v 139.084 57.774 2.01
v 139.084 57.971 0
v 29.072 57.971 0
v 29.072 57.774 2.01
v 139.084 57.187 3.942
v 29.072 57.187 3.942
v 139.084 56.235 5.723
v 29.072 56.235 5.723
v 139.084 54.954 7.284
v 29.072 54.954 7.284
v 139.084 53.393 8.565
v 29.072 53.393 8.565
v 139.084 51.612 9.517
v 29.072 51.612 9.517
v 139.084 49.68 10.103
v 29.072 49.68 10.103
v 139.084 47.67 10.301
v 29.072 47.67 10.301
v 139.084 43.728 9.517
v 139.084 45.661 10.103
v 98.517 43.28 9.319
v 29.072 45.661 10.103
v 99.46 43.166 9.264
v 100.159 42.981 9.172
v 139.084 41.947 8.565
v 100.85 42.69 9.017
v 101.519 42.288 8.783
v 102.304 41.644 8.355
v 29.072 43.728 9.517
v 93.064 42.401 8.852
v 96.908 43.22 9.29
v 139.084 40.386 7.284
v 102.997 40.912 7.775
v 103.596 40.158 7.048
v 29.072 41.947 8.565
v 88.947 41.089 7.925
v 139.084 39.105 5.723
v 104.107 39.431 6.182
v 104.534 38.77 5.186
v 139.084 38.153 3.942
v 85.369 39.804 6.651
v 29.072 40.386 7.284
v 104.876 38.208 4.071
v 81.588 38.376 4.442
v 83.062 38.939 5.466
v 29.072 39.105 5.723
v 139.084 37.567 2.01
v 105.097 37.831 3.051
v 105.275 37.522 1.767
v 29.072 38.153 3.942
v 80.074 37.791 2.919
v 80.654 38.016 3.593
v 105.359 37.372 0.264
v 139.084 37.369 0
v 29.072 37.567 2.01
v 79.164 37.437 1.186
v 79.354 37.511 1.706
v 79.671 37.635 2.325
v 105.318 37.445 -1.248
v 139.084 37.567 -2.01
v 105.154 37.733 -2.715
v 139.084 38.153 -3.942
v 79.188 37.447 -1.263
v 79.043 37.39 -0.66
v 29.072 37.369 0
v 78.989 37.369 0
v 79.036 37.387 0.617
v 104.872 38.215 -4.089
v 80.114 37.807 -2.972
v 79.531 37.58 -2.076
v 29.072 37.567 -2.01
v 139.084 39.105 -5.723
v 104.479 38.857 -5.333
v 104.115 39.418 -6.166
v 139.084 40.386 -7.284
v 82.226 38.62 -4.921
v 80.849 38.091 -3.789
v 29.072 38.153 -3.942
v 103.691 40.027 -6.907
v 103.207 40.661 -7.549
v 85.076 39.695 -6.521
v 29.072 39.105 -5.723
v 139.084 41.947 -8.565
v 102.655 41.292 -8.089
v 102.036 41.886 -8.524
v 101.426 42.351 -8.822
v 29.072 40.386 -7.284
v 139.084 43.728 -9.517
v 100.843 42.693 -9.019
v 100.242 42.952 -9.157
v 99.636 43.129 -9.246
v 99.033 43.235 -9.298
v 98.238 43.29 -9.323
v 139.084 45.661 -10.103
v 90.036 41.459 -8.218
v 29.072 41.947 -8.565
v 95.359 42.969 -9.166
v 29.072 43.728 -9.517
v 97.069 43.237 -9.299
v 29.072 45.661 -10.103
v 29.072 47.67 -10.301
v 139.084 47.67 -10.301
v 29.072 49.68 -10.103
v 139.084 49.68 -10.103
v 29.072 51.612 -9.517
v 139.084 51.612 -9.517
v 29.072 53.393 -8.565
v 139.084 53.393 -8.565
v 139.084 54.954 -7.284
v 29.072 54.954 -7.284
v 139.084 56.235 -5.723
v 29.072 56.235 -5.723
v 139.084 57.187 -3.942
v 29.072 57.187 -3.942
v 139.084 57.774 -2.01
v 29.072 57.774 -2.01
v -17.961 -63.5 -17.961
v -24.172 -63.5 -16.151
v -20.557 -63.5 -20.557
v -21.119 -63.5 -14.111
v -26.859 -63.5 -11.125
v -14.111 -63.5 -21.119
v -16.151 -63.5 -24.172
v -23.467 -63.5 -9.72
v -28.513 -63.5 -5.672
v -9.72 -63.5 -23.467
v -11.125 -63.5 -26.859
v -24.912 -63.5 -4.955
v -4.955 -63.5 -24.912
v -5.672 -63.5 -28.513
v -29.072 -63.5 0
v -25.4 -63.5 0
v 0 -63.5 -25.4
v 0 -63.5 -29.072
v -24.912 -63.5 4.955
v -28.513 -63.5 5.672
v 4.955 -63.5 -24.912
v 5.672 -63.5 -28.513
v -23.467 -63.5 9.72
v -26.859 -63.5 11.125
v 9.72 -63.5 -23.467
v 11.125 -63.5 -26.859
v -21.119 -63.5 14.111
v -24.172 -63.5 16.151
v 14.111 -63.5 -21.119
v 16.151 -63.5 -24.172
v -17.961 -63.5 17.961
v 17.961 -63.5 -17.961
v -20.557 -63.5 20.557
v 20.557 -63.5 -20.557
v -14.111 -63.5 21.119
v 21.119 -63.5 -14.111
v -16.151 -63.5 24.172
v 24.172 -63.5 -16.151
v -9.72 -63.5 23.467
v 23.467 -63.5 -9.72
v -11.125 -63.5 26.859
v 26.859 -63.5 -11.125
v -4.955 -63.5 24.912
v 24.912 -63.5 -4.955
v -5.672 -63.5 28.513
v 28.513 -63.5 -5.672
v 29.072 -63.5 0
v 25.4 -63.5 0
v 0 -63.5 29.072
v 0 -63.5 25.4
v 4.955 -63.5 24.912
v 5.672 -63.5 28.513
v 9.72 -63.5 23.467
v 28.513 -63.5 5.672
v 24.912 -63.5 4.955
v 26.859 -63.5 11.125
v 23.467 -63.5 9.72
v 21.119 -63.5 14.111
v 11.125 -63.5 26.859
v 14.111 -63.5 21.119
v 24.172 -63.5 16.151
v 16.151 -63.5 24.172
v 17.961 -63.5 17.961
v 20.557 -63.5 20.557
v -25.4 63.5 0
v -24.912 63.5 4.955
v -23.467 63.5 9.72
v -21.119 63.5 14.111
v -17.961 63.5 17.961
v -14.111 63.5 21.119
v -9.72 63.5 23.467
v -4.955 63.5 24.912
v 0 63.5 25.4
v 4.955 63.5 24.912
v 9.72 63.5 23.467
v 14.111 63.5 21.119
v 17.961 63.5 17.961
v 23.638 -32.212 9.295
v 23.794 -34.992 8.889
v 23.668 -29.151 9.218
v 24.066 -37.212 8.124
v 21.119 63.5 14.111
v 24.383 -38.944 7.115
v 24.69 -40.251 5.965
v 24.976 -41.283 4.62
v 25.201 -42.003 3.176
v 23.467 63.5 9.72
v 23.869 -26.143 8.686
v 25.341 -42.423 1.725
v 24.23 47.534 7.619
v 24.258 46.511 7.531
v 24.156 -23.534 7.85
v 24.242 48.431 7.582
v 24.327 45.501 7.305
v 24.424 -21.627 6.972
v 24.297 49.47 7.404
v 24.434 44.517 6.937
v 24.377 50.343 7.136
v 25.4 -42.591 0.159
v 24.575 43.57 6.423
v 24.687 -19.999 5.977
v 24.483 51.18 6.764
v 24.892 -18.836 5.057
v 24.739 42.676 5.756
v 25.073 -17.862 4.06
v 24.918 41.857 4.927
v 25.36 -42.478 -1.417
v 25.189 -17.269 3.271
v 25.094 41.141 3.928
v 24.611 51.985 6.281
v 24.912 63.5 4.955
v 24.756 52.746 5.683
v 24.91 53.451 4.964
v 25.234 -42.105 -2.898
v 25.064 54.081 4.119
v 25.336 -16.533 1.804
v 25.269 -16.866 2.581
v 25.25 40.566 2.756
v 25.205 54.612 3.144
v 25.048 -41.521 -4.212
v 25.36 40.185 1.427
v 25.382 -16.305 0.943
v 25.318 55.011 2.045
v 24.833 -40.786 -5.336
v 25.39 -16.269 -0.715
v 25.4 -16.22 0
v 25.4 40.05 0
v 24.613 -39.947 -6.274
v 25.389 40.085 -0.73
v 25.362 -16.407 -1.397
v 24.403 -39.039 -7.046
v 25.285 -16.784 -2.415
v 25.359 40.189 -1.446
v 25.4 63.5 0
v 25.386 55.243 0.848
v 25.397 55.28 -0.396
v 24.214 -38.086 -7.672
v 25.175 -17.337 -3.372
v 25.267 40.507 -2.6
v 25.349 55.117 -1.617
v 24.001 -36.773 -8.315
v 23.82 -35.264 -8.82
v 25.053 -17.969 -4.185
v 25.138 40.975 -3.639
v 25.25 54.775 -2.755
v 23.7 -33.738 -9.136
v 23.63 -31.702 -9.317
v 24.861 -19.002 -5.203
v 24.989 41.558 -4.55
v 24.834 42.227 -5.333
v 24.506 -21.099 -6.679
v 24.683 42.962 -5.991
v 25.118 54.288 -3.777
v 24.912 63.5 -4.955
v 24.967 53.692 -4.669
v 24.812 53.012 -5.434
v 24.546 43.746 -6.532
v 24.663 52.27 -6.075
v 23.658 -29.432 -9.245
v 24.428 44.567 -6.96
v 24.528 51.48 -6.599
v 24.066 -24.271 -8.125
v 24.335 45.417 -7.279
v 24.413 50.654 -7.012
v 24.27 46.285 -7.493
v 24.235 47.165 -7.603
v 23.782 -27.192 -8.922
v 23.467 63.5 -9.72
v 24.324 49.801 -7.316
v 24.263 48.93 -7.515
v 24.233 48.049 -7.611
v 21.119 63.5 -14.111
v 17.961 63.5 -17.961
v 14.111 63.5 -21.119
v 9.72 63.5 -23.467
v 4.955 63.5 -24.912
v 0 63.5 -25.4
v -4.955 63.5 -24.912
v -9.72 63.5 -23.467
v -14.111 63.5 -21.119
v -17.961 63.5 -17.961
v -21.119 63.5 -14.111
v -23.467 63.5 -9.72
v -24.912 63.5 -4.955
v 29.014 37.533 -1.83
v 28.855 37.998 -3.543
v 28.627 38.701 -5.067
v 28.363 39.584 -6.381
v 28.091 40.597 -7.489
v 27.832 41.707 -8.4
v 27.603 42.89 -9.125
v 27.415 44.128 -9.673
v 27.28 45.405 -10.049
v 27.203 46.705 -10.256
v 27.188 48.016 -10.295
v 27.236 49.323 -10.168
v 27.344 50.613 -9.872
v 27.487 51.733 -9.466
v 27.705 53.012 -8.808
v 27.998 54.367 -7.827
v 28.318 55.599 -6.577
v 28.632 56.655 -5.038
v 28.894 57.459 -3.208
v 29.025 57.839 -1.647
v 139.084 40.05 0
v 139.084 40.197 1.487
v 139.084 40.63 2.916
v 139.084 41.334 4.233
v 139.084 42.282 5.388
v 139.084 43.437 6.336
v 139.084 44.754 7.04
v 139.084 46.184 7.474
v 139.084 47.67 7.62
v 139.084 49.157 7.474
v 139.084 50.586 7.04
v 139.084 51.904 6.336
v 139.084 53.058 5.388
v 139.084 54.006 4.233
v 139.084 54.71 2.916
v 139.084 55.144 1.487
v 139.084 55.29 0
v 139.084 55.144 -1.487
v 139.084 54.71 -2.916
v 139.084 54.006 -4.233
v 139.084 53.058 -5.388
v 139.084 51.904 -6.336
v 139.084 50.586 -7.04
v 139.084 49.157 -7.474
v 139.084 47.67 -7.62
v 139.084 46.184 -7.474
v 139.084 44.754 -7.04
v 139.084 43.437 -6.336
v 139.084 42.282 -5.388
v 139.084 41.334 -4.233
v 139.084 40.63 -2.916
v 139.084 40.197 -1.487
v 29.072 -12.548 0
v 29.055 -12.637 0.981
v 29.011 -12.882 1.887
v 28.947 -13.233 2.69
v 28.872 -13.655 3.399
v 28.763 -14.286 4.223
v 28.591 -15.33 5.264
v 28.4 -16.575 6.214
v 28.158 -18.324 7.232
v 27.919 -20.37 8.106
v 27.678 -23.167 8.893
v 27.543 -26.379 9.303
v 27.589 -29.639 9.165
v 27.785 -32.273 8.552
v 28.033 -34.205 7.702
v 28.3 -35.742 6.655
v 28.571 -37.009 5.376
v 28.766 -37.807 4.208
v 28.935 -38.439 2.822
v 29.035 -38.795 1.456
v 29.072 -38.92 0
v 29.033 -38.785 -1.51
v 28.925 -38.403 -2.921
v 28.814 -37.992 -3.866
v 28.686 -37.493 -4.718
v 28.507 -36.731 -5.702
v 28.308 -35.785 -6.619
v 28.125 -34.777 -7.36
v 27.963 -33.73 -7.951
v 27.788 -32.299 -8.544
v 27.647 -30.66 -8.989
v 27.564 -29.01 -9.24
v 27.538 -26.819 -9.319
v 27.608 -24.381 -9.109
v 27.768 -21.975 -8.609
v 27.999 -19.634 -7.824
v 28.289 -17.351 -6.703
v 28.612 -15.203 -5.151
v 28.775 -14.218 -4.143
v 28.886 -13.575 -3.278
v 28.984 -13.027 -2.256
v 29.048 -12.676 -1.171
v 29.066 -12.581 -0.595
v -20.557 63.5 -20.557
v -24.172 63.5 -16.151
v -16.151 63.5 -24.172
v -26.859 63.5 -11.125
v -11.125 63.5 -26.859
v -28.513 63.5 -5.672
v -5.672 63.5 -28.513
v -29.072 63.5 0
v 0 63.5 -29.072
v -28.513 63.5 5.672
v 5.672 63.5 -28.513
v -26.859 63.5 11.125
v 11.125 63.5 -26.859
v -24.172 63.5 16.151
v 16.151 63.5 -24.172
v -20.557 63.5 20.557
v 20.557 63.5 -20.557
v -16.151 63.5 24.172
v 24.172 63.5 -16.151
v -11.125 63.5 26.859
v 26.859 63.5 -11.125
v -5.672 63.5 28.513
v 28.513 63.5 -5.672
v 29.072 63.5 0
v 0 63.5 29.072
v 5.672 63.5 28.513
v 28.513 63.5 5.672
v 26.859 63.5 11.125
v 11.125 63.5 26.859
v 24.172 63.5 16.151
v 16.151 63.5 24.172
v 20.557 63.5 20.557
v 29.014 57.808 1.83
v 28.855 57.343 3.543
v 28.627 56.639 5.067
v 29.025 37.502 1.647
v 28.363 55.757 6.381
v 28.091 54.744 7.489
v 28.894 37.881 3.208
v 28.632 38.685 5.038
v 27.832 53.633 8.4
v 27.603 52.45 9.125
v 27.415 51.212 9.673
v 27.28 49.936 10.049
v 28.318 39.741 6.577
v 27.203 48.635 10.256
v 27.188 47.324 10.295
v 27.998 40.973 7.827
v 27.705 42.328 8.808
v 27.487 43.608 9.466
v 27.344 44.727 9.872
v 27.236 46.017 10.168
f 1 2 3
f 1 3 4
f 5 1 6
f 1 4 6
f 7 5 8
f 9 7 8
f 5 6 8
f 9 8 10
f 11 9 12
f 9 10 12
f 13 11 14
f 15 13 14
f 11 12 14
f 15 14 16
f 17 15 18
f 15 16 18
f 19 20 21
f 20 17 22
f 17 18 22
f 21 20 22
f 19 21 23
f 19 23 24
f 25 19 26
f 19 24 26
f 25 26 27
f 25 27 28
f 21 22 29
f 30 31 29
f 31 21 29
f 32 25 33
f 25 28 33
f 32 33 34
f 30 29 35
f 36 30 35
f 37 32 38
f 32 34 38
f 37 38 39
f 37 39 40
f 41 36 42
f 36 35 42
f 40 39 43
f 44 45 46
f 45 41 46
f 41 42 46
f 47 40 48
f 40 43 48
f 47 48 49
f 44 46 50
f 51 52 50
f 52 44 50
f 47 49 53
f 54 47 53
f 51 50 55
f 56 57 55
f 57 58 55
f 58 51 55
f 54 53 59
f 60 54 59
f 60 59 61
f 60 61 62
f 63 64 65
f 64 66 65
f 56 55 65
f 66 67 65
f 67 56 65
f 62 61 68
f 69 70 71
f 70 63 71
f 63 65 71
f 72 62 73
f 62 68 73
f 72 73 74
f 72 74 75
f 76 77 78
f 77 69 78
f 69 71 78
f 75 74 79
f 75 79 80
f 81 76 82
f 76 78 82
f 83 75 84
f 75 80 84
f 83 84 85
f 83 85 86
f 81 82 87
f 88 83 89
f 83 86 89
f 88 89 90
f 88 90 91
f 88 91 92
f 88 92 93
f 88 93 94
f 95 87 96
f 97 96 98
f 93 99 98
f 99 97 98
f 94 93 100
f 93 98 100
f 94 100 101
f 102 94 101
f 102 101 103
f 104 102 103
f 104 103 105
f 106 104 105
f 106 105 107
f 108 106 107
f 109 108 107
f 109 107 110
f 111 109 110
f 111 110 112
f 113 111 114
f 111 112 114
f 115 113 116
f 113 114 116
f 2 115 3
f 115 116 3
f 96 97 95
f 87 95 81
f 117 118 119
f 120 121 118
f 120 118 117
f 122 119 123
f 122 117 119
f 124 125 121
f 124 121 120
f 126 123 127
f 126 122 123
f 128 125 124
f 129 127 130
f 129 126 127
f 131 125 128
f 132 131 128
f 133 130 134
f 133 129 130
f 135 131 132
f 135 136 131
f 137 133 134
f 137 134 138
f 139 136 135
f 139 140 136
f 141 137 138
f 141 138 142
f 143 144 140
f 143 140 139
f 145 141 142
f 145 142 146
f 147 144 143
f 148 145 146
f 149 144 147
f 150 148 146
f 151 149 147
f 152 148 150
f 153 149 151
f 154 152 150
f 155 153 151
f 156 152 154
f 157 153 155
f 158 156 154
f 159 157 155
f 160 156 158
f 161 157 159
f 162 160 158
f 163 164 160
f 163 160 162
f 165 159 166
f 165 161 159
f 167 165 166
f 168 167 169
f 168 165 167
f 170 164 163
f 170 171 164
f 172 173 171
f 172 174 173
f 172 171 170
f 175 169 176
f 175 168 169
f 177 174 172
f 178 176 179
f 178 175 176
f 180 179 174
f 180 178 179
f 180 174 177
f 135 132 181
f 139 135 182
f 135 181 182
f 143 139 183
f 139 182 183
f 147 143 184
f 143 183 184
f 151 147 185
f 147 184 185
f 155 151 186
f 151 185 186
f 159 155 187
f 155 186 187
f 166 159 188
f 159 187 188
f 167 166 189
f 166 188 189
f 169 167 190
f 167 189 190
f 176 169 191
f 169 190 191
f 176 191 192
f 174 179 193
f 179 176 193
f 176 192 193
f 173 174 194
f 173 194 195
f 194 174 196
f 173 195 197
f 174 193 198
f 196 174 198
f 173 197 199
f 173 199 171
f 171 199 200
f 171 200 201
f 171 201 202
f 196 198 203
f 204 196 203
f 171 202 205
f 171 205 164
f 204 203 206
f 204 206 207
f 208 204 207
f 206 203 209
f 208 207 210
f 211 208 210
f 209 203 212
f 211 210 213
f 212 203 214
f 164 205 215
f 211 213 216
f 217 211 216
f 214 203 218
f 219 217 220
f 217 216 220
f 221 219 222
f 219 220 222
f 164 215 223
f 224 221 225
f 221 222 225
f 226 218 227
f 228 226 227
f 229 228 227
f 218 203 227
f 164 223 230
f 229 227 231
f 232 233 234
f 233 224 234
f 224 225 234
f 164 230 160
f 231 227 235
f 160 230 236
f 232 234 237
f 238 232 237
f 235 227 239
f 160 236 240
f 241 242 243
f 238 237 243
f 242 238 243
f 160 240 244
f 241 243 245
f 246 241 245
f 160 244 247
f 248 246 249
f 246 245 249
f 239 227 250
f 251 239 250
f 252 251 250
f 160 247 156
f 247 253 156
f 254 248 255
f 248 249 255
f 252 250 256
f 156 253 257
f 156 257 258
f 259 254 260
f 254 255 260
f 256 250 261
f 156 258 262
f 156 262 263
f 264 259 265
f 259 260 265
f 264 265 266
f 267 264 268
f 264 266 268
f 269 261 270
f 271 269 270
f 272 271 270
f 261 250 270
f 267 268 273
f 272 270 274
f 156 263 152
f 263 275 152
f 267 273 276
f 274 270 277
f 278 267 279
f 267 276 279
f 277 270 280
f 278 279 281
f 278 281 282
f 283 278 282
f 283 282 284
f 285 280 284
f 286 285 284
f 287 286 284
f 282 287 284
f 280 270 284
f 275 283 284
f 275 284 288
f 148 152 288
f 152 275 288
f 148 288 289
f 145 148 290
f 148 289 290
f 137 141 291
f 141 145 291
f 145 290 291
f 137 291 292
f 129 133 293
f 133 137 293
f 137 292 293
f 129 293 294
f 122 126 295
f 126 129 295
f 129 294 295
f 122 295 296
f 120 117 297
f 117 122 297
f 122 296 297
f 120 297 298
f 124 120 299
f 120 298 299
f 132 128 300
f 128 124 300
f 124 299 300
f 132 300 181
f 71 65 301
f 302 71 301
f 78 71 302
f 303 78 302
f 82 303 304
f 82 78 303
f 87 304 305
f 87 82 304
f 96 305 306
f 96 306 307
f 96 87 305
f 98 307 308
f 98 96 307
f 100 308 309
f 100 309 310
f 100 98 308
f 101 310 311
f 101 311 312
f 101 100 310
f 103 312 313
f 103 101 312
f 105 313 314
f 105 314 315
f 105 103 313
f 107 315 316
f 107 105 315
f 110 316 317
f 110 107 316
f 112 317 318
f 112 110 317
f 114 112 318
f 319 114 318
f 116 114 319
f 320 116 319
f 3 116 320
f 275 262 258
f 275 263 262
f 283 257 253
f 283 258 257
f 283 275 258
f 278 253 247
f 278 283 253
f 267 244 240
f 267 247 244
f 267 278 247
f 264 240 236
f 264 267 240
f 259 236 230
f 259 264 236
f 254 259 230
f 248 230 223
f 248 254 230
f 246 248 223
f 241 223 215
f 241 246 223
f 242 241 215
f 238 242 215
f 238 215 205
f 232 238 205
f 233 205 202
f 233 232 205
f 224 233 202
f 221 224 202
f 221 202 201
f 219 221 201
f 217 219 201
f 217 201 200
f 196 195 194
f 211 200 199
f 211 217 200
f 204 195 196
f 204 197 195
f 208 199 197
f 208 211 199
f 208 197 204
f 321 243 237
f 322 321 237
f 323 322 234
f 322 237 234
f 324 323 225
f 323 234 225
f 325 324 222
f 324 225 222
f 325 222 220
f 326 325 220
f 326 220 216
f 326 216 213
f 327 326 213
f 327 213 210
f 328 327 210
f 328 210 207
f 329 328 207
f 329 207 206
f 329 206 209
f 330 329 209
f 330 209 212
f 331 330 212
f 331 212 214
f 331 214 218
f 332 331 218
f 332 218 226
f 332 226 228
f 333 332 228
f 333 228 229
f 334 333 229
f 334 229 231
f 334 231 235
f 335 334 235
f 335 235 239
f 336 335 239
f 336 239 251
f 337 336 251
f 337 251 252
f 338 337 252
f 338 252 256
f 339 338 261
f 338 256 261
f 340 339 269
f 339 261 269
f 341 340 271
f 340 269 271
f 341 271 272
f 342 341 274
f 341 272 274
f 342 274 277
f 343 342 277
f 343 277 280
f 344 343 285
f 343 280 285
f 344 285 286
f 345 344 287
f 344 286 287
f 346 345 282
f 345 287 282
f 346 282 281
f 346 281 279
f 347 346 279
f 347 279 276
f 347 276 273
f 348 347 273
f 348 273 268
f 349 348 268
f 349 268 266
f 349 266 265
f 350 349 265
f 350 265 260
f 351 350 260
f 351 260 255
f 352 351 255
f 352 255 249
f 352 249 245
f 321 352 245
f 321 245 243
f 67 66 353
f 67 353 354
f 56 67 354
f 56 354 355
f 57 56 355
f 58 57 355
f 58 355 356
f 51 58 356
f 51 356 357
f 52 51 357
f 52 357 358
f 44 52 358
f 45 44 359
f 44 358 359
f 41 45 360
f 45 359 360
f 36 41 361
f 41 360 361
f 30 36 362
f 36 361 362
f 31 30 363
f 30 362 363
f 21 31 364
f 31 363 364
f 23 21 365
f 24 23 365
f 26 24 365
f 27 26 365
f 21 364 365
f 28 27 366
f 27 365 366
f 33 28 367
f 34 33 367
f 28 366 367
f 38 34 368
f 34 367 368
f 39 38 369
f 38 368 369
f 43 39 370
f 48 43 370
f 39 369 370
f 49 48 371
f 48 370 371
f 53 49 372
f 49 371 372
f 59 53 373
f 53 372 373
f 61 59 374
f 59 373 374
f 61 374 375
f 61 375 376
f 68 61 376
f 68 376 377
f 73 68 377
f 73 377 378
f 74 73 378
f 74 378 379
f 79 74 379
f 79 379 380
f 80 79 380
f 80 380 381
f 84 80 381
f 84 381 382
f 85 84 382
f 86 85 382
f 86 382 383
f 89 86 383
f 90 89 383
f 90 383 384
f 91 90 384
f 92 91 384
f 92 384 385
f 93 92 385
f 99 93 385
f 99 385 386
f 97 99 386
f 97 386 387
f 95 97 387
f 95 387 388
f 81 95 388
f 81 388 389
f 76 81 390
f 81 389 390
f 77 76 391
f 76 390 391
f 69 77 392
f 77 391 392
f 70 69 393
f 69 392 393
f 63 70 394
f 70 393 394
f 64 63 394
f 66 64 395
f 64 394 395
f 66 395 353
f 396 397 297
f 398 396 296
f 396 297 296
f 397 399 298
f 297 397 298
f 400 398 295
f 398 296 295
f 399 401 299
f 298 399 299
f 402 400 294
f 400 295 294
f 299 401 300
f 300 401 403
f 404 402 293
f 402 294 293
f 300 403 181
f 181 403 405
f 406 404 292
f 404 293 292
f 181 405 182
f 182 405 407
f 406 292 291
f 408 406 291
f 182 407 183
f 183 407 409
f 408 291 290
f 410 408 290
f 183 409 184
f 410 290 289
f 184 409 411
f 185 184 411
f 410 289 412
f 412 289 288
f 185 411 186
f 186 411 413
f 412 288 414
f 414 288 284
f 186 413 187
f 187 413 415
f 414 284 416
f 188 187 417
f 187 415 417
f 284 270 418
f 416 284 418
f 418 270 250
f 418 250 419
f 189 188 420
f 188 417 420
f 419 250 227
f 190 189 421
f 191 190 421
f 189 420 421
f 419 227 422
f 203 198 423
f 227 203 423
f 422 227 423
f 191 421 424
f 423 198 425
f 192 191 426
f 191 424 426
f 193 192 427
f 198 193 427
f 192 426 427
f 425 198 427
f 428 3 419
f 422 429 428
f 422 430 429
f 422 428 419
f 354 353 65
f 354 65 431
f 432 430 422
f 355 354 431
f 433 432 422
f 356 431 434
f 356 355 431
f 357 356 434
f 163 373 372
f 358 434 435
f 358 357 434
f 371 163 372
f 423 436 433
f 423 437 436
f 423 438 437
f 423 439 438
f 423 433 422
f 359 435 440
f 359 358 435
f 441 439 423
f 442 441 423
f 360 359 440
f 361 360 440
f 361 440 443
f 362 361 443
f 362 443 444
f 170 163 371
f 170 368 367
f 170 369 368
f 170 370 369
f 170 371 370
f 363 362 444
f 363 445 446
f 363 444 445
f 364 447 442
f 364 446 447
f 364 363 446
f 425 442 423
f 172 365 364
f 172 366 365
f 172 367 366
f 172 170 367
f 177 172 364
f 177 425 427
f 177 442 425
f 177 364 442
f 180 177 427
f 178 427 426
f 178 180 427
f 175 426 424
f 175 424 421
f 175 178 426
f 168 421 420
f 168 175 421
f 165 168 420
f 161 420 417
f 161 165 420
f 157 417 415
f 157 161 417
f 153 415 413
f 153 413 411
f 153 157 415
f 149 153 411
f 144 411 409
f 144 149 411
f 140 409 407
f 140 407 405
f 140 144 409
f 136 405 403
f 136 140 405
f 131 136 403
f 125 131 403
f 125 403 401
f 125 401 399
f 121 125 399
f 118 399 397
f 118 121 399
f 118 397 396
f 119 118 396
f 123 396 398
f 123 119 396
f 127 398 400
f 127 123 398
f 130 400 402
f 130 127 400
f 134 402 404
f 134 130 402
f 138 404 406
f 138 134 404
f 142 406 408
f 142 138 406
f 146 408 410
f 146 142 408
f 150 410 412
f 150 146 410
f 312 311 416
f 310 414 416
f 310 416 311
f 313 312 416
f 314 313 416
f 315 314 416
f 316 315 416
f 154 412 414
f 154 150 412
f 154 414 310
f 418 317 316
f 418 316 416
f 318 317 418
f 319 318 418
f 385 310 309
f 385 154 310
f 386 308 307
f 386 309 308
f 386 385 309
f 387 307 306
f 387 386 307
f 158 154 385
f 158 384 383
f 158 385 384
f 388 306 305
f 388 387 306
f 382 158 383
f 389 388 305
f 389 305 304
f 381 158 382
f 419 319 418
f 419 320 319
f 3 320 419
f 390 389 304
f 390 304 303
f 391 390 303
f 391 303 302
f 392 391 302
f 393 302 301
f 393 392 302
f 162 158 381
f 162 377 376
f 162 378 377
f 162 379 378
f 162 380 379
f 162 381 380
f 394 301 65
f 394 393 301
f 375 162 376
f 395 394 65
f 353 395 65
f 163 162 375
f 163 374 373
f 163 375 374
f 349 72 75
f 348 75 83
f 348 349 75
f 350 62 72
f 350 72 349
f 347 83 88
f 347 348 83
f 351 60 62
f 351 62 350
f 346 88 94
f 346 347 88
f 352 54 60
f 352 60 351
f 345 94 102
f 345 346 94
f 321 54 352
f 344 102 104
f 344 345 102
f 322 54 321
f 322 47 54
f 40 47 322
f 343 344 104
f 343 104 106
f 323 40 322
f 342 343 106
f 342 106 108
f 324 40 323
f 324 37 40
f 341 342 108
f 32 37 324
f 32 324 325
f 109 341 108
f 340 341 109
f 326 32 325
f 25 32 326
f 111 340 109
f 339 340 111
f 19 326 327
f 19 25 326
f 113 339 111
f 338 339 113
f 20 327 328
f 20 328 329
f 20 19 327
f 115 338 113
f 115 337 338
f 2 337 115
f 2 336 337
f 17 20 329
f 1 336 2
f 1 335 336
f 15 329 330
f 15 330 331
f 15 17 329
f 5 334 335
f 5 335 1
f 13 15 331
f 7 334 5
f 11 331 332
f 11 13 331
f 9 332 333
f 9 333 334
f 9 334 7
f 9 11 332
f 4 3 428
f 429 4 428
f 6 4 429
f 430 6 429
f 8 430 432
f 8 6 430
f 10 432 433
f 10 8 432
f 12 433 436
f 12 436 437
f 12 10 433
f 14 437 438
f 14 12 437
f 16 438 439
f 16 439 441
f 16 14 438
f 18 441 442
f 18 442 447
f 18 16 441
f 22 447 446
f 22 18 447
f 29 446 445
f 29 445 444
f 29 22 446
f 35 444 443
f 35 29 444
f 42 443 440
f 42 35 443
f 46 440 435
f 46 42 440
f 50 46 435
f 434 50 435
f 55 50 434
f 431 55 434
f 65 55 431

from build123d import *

# Parameters (mm, degrees)
F0_R          = 29.0718319872
F1_DEPTH      = 63.5
F3_D          = 50.8
F6_R          = 10.3012460199
F7_DEPTH      = 110.01212
F7_DEPTH_BACK = 2.28984
F11_START     = 10.10954
F10_R         = 9.3240211729
F11_DEPTH     = 116.89046
F13_D         = 15.24
F13_DEPTH     = 127
F13_TIP       = 4.578557917
F14_R         = 25.4
F15_DEPTH     = 127


with BuildPart() as f1:
    # F0 (on Front) → F1 (new body, symmetric)
    with BuildSketch(Plane.XZ):
        Circle(F0_R)
    extrude(amount=F1_DEPTH, both=True)

    # F3 (through all)
    with Locations(Plane.XZ.offset(63.5)):
        with Locations((0, 0)):
            Hole(F3_D / 2)

    # F6 (on plane+point) → F7 (join, two sides)
    with BuildSketch(Plane.YZ.offset(29.0718319872)) as f7_sk:
        with Locations((47.6702228189, 0)):
            Circle(F6_R)
    extrude(amount=F7_DEPTH)
    extrude(f7_sk.sketch, amount=-F7_DEPTH_BACK)

    # F10 (on line) → F11 (join)
    with BuildSketch(Plane(origin=(-16.7531975657, -16.7531975657, 0), x_dir=(-0.7071067812, 0.7071067812, 0), z_dir=(0.7071067812, 0.7071067812, 0)).offset(F11_START)):
        with Locations((-38.7535318732, 0)):
            Circle(F10_R)
    extrude(amount=F11_DEPTH)

    # F13
    with Locations(Plane.YZ.offset(139.0839519872)):
        with Locations((47.6702228189, 0)):
            Hole(F13_D / 2, depth=F13_DEPTH)
            with Locations((0, 0, -(F13_DEPTH + F13_TIP / 2))):  # 118° drill point
                Cone(0, F13_D / 2, F13_TIP, mode=Mode.SUBTRACT)

    # F14 (on Front) → F15 (cut)
    with BuildSketch(Plane.XZ):
        Circle(F14_R)
    extrude(amount=F15_DEPTH, mode=Mode.SUBTRACT)


solid = f1.part
